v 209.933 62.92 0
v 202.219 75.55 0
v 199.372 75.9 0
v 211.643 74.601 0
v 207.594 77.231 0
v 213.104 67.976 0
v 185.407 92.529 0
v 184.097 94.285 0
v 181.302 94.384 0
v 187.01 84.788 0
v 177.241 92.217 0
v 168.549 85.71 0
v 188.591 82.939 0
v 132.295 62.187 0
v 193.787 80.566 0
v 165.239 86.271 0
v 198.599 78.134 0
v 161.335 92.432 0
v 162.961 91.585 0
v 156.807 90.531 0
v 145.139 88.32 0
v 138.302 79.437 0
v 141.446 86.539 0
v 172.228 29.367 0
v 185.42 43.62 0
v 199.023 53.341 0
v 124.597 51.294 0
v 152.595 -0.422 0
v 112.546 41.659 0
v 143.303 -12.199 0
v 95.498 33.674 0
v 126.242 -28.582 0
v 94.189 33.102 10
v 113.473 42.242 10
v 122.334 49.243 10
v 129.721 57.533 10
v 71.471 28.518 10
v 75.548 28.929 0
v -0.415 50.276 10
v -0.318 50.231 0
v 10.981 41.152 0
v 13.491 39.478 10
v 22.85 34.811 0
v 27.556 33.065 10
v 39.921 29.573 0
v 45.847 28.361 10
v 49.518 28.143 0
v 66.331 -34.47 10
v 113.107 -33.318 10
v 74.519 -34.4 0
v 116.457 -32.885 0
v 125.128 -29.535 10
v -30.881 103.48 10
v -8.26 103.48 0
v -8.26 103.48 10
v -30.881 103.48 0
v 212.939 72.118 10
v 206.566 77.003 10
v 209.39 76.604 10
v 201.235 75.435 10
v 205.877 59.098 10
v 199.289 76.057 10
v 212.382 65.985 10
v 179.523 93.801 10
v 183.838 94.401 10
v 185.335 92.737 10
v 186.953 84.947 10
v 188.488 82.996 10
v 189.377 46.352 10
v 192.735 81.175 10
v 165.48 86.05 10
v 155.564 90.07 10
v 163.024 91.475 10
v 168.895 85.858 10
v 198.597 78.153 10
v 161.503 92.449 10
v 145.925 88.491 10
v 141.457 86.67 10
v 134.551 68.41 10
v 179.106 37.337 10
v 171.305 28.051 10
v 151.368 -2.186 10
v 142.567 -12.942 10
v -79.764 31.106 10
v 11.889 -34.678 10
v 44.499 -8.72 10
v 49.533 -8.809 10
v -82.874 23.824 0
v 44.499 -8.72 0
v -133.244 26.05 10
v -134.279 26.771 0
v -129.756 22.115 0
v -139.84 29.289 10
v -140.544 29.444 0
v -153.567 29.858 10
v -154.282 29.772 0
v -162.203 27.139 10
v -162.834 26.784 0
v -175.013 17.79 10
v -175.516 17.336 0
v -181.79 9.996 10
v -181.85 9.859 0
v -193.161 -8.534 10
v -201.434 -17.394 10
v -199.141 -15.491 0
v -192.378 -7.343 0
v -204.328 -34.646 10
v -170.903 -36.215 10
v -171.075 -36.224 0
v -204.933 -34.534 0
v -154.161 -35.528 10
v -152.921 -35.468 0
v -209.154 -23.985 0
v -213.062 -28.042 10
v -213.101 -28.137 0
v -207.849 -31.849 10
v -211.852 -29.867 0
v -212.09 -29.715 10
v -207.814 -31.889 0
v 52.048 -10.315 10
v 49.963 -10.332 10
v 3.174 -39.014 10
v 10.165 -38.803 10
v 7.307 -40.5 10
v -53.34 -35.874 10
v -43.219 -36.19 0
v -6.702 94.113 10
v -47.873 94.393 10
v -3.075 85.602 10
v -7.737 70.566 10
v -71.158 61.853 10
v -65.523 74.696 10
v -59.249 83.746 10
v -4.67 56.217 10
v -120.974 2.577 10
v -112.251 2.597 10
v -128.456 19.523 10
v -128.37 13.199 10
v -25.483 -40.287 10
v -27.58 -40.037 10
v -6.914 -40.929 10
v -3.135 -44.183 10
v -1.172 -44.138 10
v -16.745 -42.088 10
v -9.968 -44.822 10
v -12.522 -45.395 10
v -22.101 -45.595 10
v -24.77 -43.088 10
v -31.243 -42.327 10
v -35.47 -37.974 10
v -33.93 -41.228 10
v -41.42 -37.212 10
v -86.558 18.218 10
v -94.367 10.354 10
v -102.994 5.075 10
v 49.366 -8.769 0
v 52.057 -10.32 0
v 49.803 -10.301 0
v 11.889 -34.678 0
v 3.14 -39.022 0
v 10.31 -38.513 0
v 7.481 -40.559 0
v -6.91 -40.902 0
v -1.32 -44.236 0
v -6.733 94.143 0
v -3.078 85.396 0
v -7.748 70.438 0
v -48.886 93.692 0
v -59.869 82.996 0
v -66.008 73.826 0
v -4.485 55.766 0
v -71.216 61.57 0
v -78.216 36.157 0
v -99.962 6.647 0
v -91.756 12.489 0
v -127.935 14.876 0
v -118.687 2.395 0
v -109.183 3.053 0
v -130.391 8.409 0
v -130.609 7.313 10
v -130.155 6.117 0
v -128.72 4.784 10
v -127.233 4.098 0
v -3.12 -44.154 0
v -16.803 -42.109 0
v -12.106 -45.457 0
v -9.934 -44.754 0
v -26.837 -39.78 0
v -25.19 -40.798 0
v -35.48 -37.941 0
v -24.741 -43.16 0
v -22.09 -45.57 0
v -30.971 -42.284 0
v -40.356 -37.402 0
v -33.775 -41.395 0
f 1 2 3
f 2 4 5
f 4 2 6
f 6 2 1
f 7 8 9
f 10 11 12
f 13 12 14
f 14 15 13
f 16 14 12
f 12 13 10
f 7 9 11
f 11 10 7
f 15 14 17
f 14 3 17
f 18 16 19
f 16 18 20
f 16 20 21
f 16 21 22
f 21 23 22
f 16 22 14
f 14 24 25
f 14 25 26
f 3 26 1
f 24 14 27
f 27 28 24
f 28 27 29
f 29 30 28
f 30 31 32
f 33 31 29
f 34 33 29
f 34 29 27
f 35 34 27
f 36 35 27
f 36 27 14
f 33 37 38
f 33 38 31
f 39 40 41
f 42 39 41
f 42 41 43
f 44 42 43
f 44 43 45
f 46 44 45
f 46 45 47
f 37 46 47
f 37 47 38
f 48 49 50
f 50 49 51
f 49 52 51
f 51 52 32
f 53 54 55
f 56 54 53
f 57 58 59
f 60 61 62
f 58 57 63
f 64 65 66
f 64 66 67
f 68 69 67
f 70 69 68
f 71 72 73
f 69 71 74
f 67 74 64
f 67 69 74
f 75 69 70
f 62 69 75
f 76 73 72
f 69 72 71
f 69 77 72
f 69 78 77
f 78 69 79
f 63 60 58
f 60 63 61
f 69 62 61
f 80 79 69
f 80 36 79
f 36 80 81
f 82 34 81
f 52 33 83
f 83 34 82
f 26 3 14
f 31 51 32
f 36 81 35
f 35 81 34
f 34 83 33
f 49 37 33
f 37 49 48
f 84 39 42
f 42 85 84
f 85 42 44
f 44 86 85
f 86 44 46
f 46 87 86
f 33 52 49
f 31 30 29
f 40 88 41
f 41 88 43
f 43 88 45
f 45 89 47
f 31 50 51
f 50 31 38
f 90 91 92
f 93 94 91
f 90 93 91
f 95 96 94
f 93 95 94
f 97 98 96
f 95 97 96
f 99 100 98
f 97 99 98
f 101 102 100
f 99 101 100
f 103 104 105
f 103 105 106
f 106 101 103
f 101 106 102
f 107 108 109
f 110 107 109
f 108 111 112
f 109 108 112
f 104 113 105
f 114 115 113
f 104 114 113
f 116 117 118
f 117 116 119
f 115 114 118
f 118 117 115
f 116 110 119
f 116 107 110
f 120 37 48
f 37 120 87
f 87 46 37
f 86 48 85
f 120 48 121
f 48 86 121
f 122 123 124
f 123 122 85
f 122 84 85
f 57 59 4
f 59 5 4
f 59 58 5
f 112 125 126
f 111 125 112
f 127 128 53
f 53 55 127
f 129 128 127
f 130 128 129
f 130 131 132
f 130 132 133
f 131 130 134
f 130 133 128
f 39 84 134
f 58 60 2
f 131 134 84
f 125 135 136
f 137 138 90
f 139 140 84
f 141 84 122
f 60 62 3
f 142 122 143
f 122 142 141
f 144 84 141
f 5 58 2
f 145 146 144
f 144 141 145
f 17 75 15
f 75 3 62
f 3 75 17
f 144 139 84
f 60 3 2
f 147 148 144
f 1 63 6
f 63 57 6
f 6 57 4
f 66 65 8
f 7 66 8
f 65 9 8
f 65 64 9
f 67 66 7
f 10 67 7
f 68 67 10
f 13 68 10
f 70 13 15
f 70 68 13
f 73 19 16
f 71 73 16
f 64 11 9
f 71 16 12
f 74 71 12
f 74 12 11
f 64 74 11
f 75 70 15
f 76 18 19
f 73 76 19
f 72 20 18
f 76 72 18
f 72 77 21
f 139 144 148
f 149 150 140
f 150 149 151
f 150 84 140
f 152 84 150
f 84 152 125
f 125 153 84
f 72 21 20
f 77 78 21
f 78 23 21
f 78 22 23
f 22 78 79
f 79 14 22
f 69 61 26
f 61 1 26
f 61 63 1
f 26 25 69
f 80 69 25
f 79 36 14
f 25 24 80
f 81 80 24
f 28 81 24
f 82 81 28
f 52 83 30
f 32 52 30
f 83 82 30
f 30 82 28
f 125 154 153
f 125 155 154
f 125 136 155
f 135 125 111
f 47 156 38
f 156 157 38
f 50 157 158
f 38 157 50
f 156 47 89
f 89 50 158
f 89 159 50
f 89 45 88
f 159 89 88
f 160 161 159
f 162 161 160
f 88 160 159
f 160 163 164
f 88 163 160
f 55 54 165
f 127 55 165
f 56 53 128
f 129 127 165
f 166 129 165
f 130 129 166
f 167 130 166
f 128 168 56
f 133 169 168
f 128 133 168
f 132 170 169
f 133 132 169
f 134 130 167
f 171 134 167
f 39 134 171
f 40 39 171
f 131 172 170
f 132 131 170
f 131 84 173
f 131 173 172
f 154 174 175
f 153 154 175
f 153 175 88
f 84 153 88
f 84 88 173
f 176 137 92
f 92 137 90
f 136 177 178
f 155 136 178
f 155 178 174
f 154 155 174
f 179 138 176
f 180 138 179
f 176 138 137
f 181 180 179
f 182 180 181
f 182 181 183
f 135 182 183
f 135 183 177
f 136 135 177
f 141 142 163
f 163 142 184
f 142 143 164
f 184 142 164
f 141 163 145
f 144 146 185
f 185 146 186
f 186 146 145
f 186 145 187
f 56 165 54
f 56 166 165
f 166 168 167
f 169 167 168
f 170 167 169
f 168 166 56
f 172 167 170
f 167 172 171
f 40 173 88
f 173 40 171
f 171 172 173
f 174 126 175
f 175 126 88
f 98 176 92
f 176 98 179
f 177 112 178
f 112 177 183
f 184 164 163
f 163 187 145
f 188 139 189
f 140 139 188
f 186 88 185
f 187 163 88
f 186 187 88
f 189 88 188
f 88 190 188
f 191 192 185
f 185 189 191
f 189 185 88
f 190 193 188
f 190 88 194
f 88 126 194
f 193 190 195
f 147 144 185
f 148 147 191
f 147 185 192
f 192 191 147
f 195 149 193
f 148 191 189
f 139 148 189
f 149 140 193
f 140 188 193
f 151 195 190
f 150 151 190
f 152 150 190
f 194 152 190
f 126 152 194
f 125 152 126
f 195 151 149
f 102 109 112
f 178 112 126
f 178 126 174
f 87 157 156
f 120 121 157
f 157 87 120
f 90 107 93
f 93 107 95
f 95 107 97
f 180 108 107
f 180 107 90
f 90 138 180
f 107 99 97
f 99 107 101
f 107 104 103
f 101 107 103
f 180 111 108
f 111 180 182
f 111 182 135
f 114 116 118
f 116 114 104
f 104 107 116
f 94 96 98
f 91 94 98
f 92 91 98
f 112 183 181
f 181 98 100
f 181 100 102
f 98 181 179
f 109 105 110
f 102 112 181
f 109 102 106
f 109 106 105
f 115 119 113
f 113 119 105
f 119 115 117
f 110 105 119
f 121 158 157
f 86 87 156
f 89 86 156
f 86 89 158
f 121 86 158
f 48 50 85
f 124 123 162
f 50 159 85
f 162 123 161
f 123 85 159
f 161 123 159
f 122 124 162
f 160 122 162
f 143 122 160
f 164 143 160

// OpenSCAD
module object1(scale) {polyhedron(
 points=[[199.37167358398438,75.90013885498047,0],[202.21896362304688,75.55001068115234,0],[209.93312072753906,62.91959762573242,0],
[207.5940704345703,77.23053741455078,0],[211.64306640625,74.60130310058594,0],[202.21896362304688,75.55001068115234,0],
[213.1039581298828,67.97622680664062,0],[202.21896362304688,75.55001068115234,0],[211.64306640625,74.60130310058594,0],
[209.93312072753906,62.91959762573242,0],[202.21896362304688,75.55001068115234,0],[213.1039581298828,67.97622680664062,0],
[181.3023681640625,94.38363647460938,0],[184.09671020507812,94.28502655029297,0],[185.40660095214844,92.5289535522461,0],
[168.54913330078125,85.71012115478516,0],[177.24105834960938,92.21691131591797,0],[187.0101776123047,84.78828430175781,0],
[132.2948760986328,62.18728256225586,0],[168.54913330078125,85.71012115478516,0],[188.59071350097656,82.93917846679688,0],
[188.59071350097656,82.93917846679688,0],[193.78683471679688,80.5660629272461,0],[132.2948760986328,62.18728256225586,0],
[168.54913330078125,85.71012115478516,0],[132.2948760986328,62.18728256225586,0],[165.23886108398438,86.27050018310547,0],
[187.0101776123047,84.78828430175781,0],[188.59071350097656,82.93917846679688,0],[168.54913330078125,85.71012115478516,0],
[177.24105834960938,92.21691131591797,0],[181.3023681640625,94.38363647460938,0],[185.40660095214844,92.5289535522461,0],
[185.40660095214844,92.5289535522461,0],[187.0101776123047,84.78828430175781,0],[177.24105834960938,92.21691131591797,0],
[198.59877014160156,78.13407135009766,0],[132.2948760986328,62.18728256225586,0],[193.78683471679688,80.5660629272461,0],
[198.59877014160156,78.13407135009766,0],[199.37167358398438,75.90013885498047,0],[132.2948760986328,62.18728256225586,0],
[162.96141052246094,91.58535766601562,0],[165.23886108398438,86.27050018310547,0],[161.33468627929688,92.43206787109375,0],
[156.8072967529297,90.53131866455078,0],[161.33468627929688,92.43206787109375,0],[165.23886108398438,86.27050018310547,0],
[145.1394500732422,88.31961822509766,0],[156.8072967529297,90.53131866455078,0],[165.23886108398438,86.27050018310547,0],
[138.30226135253906,79.4373550415039,0],[145.1394500732422,88.31961822509766,0],[165.23886108398438,86.27050018310547,0],
[138.30226135253906,79.4373550415039,0],[141.44580078125,86.53934478759766,0],[145.1394500732422,88.31961822509766,0],
[132.2948760986328,62.18728256225586,0],[138.30226135253906,79.4373550415039,0],[165.23886108398438,86.27050018310547,0],
[185.42034912109375,43.62025833129883,0],[172.22792053222656,29.366931915283203,0],[132.2948760986328,62.18728256225586,0],
[199.02317810058594,53.34084701538086,0],[185.42034912109375,43.62025833129883,0],[132.2948760986328,62.18728256225586,0],
[209.93312072753906,62.91959762573242,0],[199.02317810058594,53.34084701538086,0],[199.37167358398438,75.90013885498047,0],
[124.59748077392578,51.29447555541992,0],[132.2948760986328,62.18728256225586,0],[172.22792053222656,29.366931915283203,0],
[172.22792053222656,29.366931915283203,0],[152.59469604492188,-0.42217034101486206,0],[124.59748077392578,51.29447555541992,0],
[112.54574584960938,41.65903854370117,0],[124.59748077392578,51.29447555541992,0],[152.59469604492188,-0.42217034101486206,0],
[152.59469604492188,-0.42217034101486206,0],[143.30255126953125,-12.19916820526123,0],[112.54574584960938,41.65903854370117,0],
[126.24242401123047,-28.581745147705078,0],[95.49767303466797,33.674278259277344,0],[143.30255126953125,-12.19916820526123,0],
[112.54574584960938,41.65903854370117,0],[95.49767303466797,33.674278259277344,0],[94.1887435913086,33.1020393371582,10],
[112.54574584960938,41.65903854370117,0],[94.1887435913086,33.1020393371582,10],[113.4732666015625,42.2421989440918,10],
[124.59748077392578,51.29447555541992,0],[112.54574584960938,41.65903854370117,0],[113.4732666015625,42.2421989440918,10],
[124.59748077392578,51.29447555541992,0],[113.4732666015625,42.2421989440918,10],[122.33402252197266,49.24305725097656,10],
[124.59748077392578,51.29447555541992,0],[122.33402252197266,49.24305725097656,10],[129.7212371826172,57.533226013183594,10],
[132.2948760986328,62.18728256225586,0],[124.59748077392578,51.29447555541992,0],[129.7212371826172,57.533226013183594,10],
[75.54798126220703,28.928678512573242,0],[71.4708480834961,28.517797470092773,10],[94.1887435913086,33.1020393371582,10],
[95.49767303466797,33.674278259277344,0],[75.54798126220703,28.928678512573242,0],[94.1887435913086,33.1020393371582,10],
[10.981195449829102,41.152252197265625,0],[-0.3182032108306885,50.23066329956055,0],[-0.4153667092323303,50.275516510009766,10],
[10.981195449829102,41.152252197265625,0],[-0.4153667092323303,50.275516510009766,10],[13.491422653198242,39.477725982666016,10],
[22.850000381469727,34.810760498046875,0],[10.981195449829102,41.152252197265625,0],[13.491422653198242,39.477725982666016,10],
[22.850000381469727,34.810760498046875,0],[13.491422653198242,39.477725982666016,10],[27.555904388427734,33.06477737426758,10],
[39.92094802856445,29.573442459106445,0],[22.850000381469727,34.810760498046875,0],[27.555904388427734,33.06477737426758,10],
[39.92094802856445,29.573442459106445,0],[27.555904388427734,33.06477737426758,10],[45.847076416015625,28.361417770385742,10],
[49.51791763305664,28.14299201965332,0],[39.92094802856445,29.573442459106445,0],[45.847076416015625,28.361417770385742,10],
[49.51791763305664,28.14299201965332,0],[45.847076416015625,28.361417770385742,10],[71.4708480834961,28.517797470092773,10],
[75.54798126220703,28.928678512573242,0],[49.51791763305664,28.14299201965332,0],[71.4708480834961,28.517797470092773,10],
[74.51927185058594,-34.40031051635742,0],[113.10662841796875,-33.31764221191406,10],[66.33106231689453,-34.47044372558594,10],
[116.45669555664062,-32.88462829589844,0],[113.10662841796875,-33.31764221191406,10],[74.51927185058594,-34.40031051635742,0],
[116.45669555664062,-32.88462829589844,0],[125.12801361083984,-29.535409927368164,10],[113.10662841796875,-33.31764221191406,10],
[126.24242401123047,-28.581745147705078,0],[125.12801361083984,-29.535409927368164,10],[116.45669555664062,-32.88462829589844,0],
[-8.260000228881836,103.4800033569336,10],[-8.260000228881836,103.4800033569336,0],[-30.881000518798828,103.4800033569336,10],
[-30.881000518798828,103.4800033569336,10],[-8.260000228881836,103.4800033569336,0],[-30.881000518798828,103.4800033569336,0],
[209.38973999023438,76.6042251586914,10],[206.56561279296875,77.00340270996094,10],[212.93914794921875,72.11756134033203,10],
[199.28900146484375,76.05670928955078,10],[205.87713623046875,59.09784698486328,10],[201.23477172851562,75.43526458740234,10],
[212.38209533691406,65.98548126220703,10],[212.93914794921875,72.11756134033203,10],[206.56561279296875,77.00340270996094,10],
[185.33534240722656,92.7367935180664,10],[183.83792114257812,94.40069580078125,10],[179.52325439453125,93.80120086669922,10],
[186.9530792236328,84.94690704345703,10],[185.33534240722656,92.7367935180664,10],[179.52325439453125,93.80120086669922,10],
[186.9530792236328,84.94690704345703,10],[189.37725830078125,46.35154342651367,10],[188.4876708984375,82.99583435058594,10],
[188.4876708984375,82.99583435058594,10],[189.37725830078125,46.35154342651367,10],[192.73458862304688,81.174560546875,10],
[163.02427673339844,91.47467803955078,10],[155.56365966796875,90.07017517089844,10],[165.48045349121094,86.05018615722656,10],
[168.8946533203125,85.85816955566406,10],[165.48045349121094,86.05018615722656,10],[189.37725830078125,46.35154342651367,10],
[179.52325439453125,93.80120086669922,10],[168.8946533203125,85.85816955566406,10],[186.9530792236328,84.94690704345703,10],
[168.8946533203125,85.85816955566406,10],[189.37725830078125,46.35154342651367,10],[186.9530792236328,84.94690704345703,10],
[192.73458862304688,81.174560546875,10],[189.37725830078125,46.35154342651367,10],[198.5966339111328,78.153076171875,10],
[198.5966339111328,78.153076171875,10],[189.37725830078125,46.35154342651367,10],[199.28900146484375,76.05670928955078,10],
[155.56365966796875,90.07017517089844,10],[163.02427673339844,91.47467803955078,10],[161.5028076171875,92.4485092163086,10],
[165.48045349121094,86.05018615722656,10],[155.56365966796875,90.07017517089844,10],[189.37725830078125,46.35154342651367,10],
[155.56365966796875,90.07017517089844,10],[145.92495727539062,88.49105072021484,10],[189.37725830078125,46.35154342651367,10],
[145.92495727539062,88.49105072021484,10],[141.45726013183594,86.66956329345703,10],[189.37725830078125,46.35154342651367,10],
[134.55137634277344,68.40991973876953,10],[189.37725830078125,46.35154342651367,10],[141.45726013183594,86.66956329345703,10],
[206.56561279296875,77.00340270996094,10],[201.23477172851562,75.43526458740234,10],[212.38209533691406,65.98548126220703,10],
[205.87713623046875,59.09784698486328,10],[212.38209533691406,65.98548126220703,10],[201.23477172851562,75.43526458740234,10],
[205.87713623046875,59.09784698486328,10],[199.28900146484375,76.05670928955078,10],[189.37725830078125,46.35154342651367,10],
[189.37725830078125,46.35154342651367,10],[134.55137634277344,68.40991973876953,10],[179.1058349609375,37.33666229248047,10],
[134.55137634277344,68.40991973876953,10],[129.7212371826172,57.533226013183594,10],[179.1058349609375,37.33666229248047,10],
[171.30477905273438,28.05082893371582,10],[179.1058349609375,37.33666229248047,10],[129.7212371826172,57.533226013183594,10],
[171.30477905273438,28.05082893371582,10],[113.4732666015625,42.2421989440918,10],[151.36825561523438,-2.185760974884033,10],
[142.56651306152344,-12.942140579223633,10],[94.1887435913086,33.1020393371582,10],[125.12801361083984,-29.535409927368164,10],
[151.36825561523438,-2.185760974884033,10],[113.4732666015625,42.2421989440918,10],[142.56651306152344,-12.942140579223633,10],
[132.2948760986328,62.18728256225586,0],[199.37167358398438,75.90013885498047,0],[199.02317810058594,53.34084701538086,0],
[126.24242401123047,-28.581745147705078,0],[116.45669555664062,-32.88462829589844,0],[95.49767303466797,33.674278259277344,0],
[122.33402252197266,49.24305725097656,10],[171.30477905273438,28.05082893371582,10],[129.7212371826172,57.533226013183594,10],
[113.4732666015625,42.2421989440918,10],[171.30477905273438,28.05082893371582,10],[122.33402252197266,49.24305725097656,10],
[94.1887435913086,33.1020393371582,10],[142.56651306152344,-12.942140579223633,10],[113.4732666015625,42.2421989440918,10],
[94.1887435913086,33.1020393371582,10],[71.4708480834961,28.517797470092773,10],[113.10662841796875,-33.31764221191406,10],
[66.33106231689453,-34.47044372558594,10],[113.10662841796875,-33.31764221191406,10],[71.4708480834961,28.517797470092773,10],
[13.491422653198242,39.477725982666016,10],[-0.4153667092323303,50.275516510009766,10],[-79.7637710571289,31.10643196105957,10],
[-79.7637710571289,31.10643196105957,10],[11.888999938964844,-34.678001403808594,10],[13.491422653198242,39.477725982666016,10],
[27.555904388427734,33.06477737426758,10],[13.491422653198242,39.477725982666016,10],[11.888999938964844,-34.678001403808594,10],
[11.888999938964844,-34.678001403808594,10],[44.499000549316406,-8.720000267028809,10],[27.555904388427734,33.06477737426758,10],
[45.847076416015625,28.361417770385742,10],[27.555904388427734,33.06477737426758,10],[44.499000549316406,-8.720000267028809,10],
[44.499000549316406,-8.720000267028809,10],[49.53274154663086,-8.809224128723145,10],[45.847076416015625,28.361417770385742,10],
[113.10662841796875,-33.31764221191406,10],[125.12801361083984,-29.535409927368164,10],[94.1887435913086,33.1020393371582,10],
[112.54574584960938,41.65903854370117,0],[143.30255126953125,-12.19916820526123,0],[95.49767303466797,33.674278259277344,0],
[10.981195449829102,41.152252197265625,0],[-82.87432098388672,23.8238582611084,0],[-0.3182032108306885,50.23066329956055,0],
[22.850000381469727,34.810760498046875,0],[-82.87432098388672,23.8238582611084,0],[10.981195449829102,41.152252197265625,0],
[39.92094802856445,29.573442459106445,0],[-82.87432098388672,23.8238582611084,0],[22.850000381469727,34.810760498046875,0],
[49.51791763305664,28.14299201965332,0],[44.499000549316406,-8.720000267028809,0],[39.92094802856445,29.573442459106445,0],
[116.45669555664062,-32.88462829589844,0],[74.51927185058594,-34.40031051635742,0],[95.49767303466797,33.674278259277344,0],
[75.54798126220703,28.928678512573242,0],[95.49767303466797,33.674278259277344,0],[74.51927185058594,-34.40031051635742,0],
[-129.7556915283203,22.115089416503906,0],[-134.27857971191406,26.770544052124023,0],[-133.2444610595703,26.04967498779297,10],
[-134.27857971191406,26.770544052124023,0],[-140.54364013671875,29.44390869140625,0],[-139.84039306640625,29.28890037536621,10],
[-134.27857971191406,26.770544052124023,0],[-139.84039306640625,29.28890037536621,10],[-133.2444610595703,26.04967498779297,10],
[-140.54364013671875,29.44390869140625,0],[-154.28233337402344,29.771726608276367,0],[-153.567138671875,29.858436584472656,10],
[-140.54364013671875,29.44390869140625,0],[-153.567138671875,29.858436584472656,10],[-139.84039306640625,29.28890037536621,10],
[-154.28233337402344,29.771726608276367,0],[-162.83412170410156,26.783966064453125,0],[-162.2031707763672,27.13936996459961,10],
[-154.28233337402344,29.771726608276367,0],[-162.2031707763672,27.13936996459961,10],[-153.567138671875,29.858436584472656,10],
[-162.83412170410156,26.783966064453125,0],[-175.51565551757812,17.33550262451172,0],[-175.01324462890625,17.790390014648438,10],
[-162.83412170410156,26.783966064453125,0],[-175.01324462890625,17.790390014648438,10],[-162.2031707763672,27.13936996459961,10],
[-175.51565551757812,17.33550262451172,0],[-181.8504180908203,9.858535766601562,0],[-181.78970336914062,9.995529174804688,10],
[-175.51565551757812,17.33550262451172,0],[-181.78970336914062,9.995529174804688,10],[-175.01324462890625,17.790390014648438,10],
[-199.14105224609375,-15.491259574890137,0],[-201.43392944335938,-17.39444923400879,10],[-193.16064453125,-8.533787727355957,10],
[-192.3775634765625,-7.343181133270264,0],[-199.14105224609375,-15.491259574890137,0],[-193.16064453125,-8.533787727355957,10],
[-193.16064453125,-8.533787727355957,10],[-181.78970336914062,9.995529174804688,10],[-192.3775634765625,-7.343181133270264,0],
[-181.8504180908203,9.858535766601562,0],[-192.3775634765625,-7.343181133270264,0],[-181.78970336914062,9.995529174804688,10],
[-171.0751953125,-36.22438049316406,0],[-170.90338134765625,-36.21523666381836,10],[-204.3284912109375,-34.645782470703125,10],
[-171.0751953125,-36.22438049316406,0],[-204.3284912109375,-34.645782470703125,10],[-204.9325714111328,-34.53371047973633,0],
[-152.92137145996094,-35.468204498291016,0],[-154.16140747070312,-35.52764892578125,10],[-170.90338134765625,-36.21523666381836,10],
[-152.92137145996094,-35.468204498291016,0],[-170.90338134765625,-36.21523666381836,10],[-171.0751953125,-36.22438049316406,0],
[-199.14105224609375,-15.491259574890137,0],[-209.1544952392578,-23.985443115234375,0],[-201.43392944335938,-17.39444923400879,10],
[-209.1544952392578,-23.985443115234375,0],[-213.1012725830078,-28.137075424194336,0],[-213.0622100830078,-28.042200088500977,10],
[-209.1544952392578,-23.985443115234375,0],[-213.0622100830078,-28.042200088500977,10],[-201.43392944335938,-17.39444923400879,10],
[-212.09007263183594,-29.714599609375,10],[-211.85186767578125,-29.86714744567871,0],[-207.84930419921875,-31.84939193725586,10],
[-207.81443786621094,-31.88942527770996,0],[-207.84930419921875,-31.84939193725586,10],[-211.85186767578125,-29.86714744567871,0],
[-212.09007263183594,-29.714599609375,10],[-213.0622100830078,-28.042200088500977,10],[-213.1012725830078,-28.137075424194336,0],
[-213.1012725830078,-28.137075424194336,0],[-211.85186767578125,-29.86714744567871,0],[-212.09007263183594,-29.714599609375,10],
[-207.81443786621094,-31.88942527770996,0],[-204.9325714111328,-34.53371047973633,0],[-207.84930419921875,-31.84939193725586,10],
[-204.9325714111328,-34.53371047973633,0],[-204.3284912109375,-34.645782470703125,10],[-207.84930419921875,-31.84939193725586,10],
[66.33106231689453,-34.47044372558594,10],[71.4708480834961,28.517797470092773,10],[52.048072814941406,-10.315421104431152,10],
[49.53274154663086,-8.809224128723145,10],[52.048072814941406,-10.315421104431152,10],[71.4708480834961,28.517797470092773,10],
[71.4708480834961,28.517797470092773,10],[45.847076416015625,28.361417770385742,10],[49.53274154663086,-8.809224128723145,10],
[11.888999938964844,-34.678001403808594,10],[66.33106231689453,-34.47044372558594,10],[44.499000549316406,-8.720000267028809,10],
[49.962650299072266,-10.331576347351074,10],[66.33106231689453,-34.47044372558594,10],[52.048072814941406,-10.315421104431152,10],
[49.962650299072266,-10.331576347351074,10],[44.499000549316406,-8.720000267028809,10],[66.33106231689453,-34.47044372558594,10],
[7.306832790374756,-40.499656677246094,10],[10.165343284606934,-38.80281066894531,10],[3.173877239227295,-39.01404571533203,10],
[11.888999938964844,-34.678001403808594,10],[3.173877239227295,-39.01404571533203,10],[10.165343284606934,-38.80281066894531,10],
[11.888999938964844,-34.678001403808594,10],[-79.7637710571289,31.10643196105957,10],[3.173877239227295,-39.01404571533203,10],
[211.64306640625,74.60130310058594,0],[209.38973999023438,76.6042251586914,10],[212.93914794921875,72.11756134033203,10],
[211.64306640625,74.60130310058594,0],[207.5940704345703,77.23053741455078,0],[209.38973999023438,76.6042251586914,10],
[207.5940704345703,77.23053741455078,0],[206.56561279296875,77.00340270996094,10],[209.38973999023438,76.6042251586914,10],
[-43.21868896484375,-36.18983459472656,0],[-53.33951187133789,-35.874061584472656,10],[-152.92137145996094,-35.468204498291016,0],
[-152.92137145996094,-35.468204498291016,0],[-53.33951187133789,-35.874061584472656,10],[-154.16140747070312,-35.52764892578125,10],
[-30.881000518798828,103.4800033569336,10],[-47.872615814208984,94.39278411865234,10],[-6.701964378356934,94.11285400390625,10],
[-6.701964378356934,94.11285400390625,10],[-8.260000228881836,103.4800033569336,10],[-30.881000518798828,103.4800033569336,10],
[-6.701964378356934,94.11285400390625,10],[-47.872615814208984,94.39278411865234,10],[-3.074937343597412,85.6019058227539,10],
[-3.074937343597412,85.6019058227539,10],[-47.872615814208984,94.39278411865234,10],[-7.737444877624512,70.5660629272461,10],
[-65.5233154296875,74.696044921875,10],[-71.158203125,61.85307693481445,10],[-7.737444877624512,70.5660629272461,10],
[-59.248958587646484,83.74592590332031,10],[-65.5233154296875,74.696044921875,10],[-7.737444877624512,70.5660629272461,10],
[-4.6702046394348145,56.216670989990234,10],[-7.737444877624512,70.5660629272461,10],[-71.158203125,61.85307693481445,10],
[-47.872615814208984,94.39278411865234,10],[-59.248958587646484,83.74592590332031,10],[-7.737444877624512,70.5660629272461,10],
[-4.6702046394348145,56.216670989990234,10],[-79.7637710571289,31.10643196105957,10],[-0.4153667092323303,50.275516510009766,10],
[202.21896362304688,75.55001068115234,0],[201.23477172851562,75.43526458740234,10],[206.56561279296875,77.00340270996094,10],
[-79.7637710571289,31.10643196105957,10],[-4.6702046394348145,56.216670989990234,10],[-71.158203125,61.85307693481445,10],
[-112.2509994506836,2.5969998836517334,10],[-120.97369384765625,2.577406167984009,10],[-53.33951187133789,-35.874061584472656,10],
[-133.2444610595703,26.04967498779297,10],[-128.36959838867188,13.199297904968262,10],[-128.45645141601562,19.52318572998047,10],
[-79.7637710571289,31.10643196105957,10],[-27.580223083496094,-40.037071228027344,10],[-25.483245849609375,-40.286685943603516,10],
[3.173877239227295,-39.01404571533203,10],[-79.7637710571289,31.10643196105957,10],[-6.914295196533203,-40.92919921875,10],
[199.37167358398438,75.90013885498047,0],[199.28900146484375,76.05670928955078,10],[201.23477172851562,75.43526458740234,10],
[-1.1721389293670654,-44.13786697387695,10],[3.173877239227295,-39.01404571533203,10],[-3.135453224182129,-44.18324279785156,10],
[-6.914295196533203,-40.92919921875,10],[-3.135453224182129,-44.18324279785156,10],[3.173877239227295,-39.01404571533203,10],
[-6.914295196533203,-40.92919921875,10],[-79.7637710571289,31.10643196105957,10],[-16.7452392578125,-42.088287353515625,10],
[202.21896362304688,75.55001068115234,0],[206.56561279296875,77.00340270996094,10],[207.5940704345703,77.23053741455078,0],
[-16.7452392578125,-42.088287353515625,10],[-12.522496223449707,-45.394588470458984,10],[-9.967960357666016,-44.82192611694336,10],
[-9.967960357666016,-44.82192611694336,10],[-6.914295196533203,-40.92919921875,10],[-16.7452392578125,-42.088287353515625,10],
[193.78683471679688,80.5660629272461,0],[198.5966339111328,78.153076171875,10],[198.59877014160156,78.13407135009766,0],
[199.28900146484375,76.05670928955078,10],[199.37167358398438,75.90013885498047,0],[198.5966339111328,78.153076171875,10],
[198.59877014160156,78.13407135009766,0],[198.5966339111328,78.153076171875,10],[199.37167358398438,75.90013885498047,0],
[-79.7637710571289,31.10643196105957,10],[-25.483245849609375,-40.286685943603516,10],[-16.7452392578125,-42.088287353515625,10],
[202.21896362304688,75.55001068115234,0],[199.37167358398438,75.90013885498047,0],[201.23477172851562,75.43526458740234,10],
[-16.7452392578125,-42.088287353515625,10],[-24.770307540893555,-43.088199615478516,10],[-22.10101318359375,-45.594539642333984,10],
[213.1039581298828,67.97622680664062,0],[212.38209533691406,65.98548126220703,10],[209.93312072753906,62.91959762573242,0],
[213.1039581298828,67.97622680664062,0],[212.93914794921875,72.11756134033203,10],[212.38209533691406,65.98548126220703,10],
[211.64306640625,74.60130310058594,0],[212.93914794921875,72.11756134033203,10],[213.1039581298828,67.97622680664062,0],
[184.09671020507812,94.28502655029297,0],[183.83792114257812,94.40069580078125,10],[185.33534240722656,92.7367935180664,10],
[184.09671020507812,94.28502655029297,0],[185.33534240722656,92.7367935180664,10],[185.40660095214844,92.5289535522461,0],
[184.09671020507812,94.28502655029297,0],[181.3023681640625,94.38363647460938,0],[183.83792114257812,94.40069580078125,10],
[181.3023681640625,94.38363647460938,0],[179.52325439453125,93.80120086669922,10],[183.83792114257812,94.40069580078125,10],
[185.40660095214844,92.5289535522461,0],[185.33534240722656,92.7367935180664,10],[186.9530792236328,84.94690704345703,10],
[185.40660095214844,92.5289535522461,0],[186.9530792236328,84.94690704345703,10],[187.0101776123047,84.78828430175781,0],
[187.0101776123047,84.78828430175781,0],[186.9530792236328,84.94690704345703,10],[188.4876708984375,82.99583435058594,10],
[187.0101776123047,84.78828430175781,0],[188.4876708984375,82.99583435058594,10],[188.59071350097656,82.93917846679688,0],
[193.78683471679688,80.5660629272461,0],[188.59071350097656,82.93917846679688,0],[192.73458862304688,81.174560546875,10],
[188.59071350097656,82.93917846679688,0],[188.4876708984375,82.99583435058594,10],[192.73458862304688,81.174560546875,10],
[165.23886108398438,86.27050018310547,0],[162.96141052246094,91.58535766601562,0],[163.02427673339844,91.47467803955078,10],
[165.23886108398438,86.27050018310547,0],[163.02427673339844,91.47467803955078,10],[165.48045349121094,86.05018615722656,10],
[181.3023681640625,94.38363647460938,0],[177.24105834960938,92.21691131591797,0],[179.52325439453125,93.80120086669922,10],
[168.54913330078125,85.71012115478516,0],[165.23886108398438,86.27050018310547,0],[165.48045349121094,86.05018615722656,10],
[168.54913330078125,85.71012115478516,0],[165.48045349121094,86.05018615722656,10],[168.8946533203125,85.85816955566406,10],
[177.24105834960938,92.21691131591797,0],[168.54913330078125,85.71012115478516,0],[168.8946533203125,85.85816955566406,10],
[177.24105834960938,92.21691131591797,0],[168.8946533203125,85.85816955566406,10],[179.52325439453125,93.80120086669922,10],
[193.78683471679688,80.5660629272461,0],[192.73458862304688,81.174560546875,10],[198.5966339111328,78.153076171875,10],
[162.96141052246094,91.58535766601562,0],[161.33468627929688,92.43206787109375,0],[161.5028076171875,92.4485092163086,10],
[162.96141052246094,91.58535766601562,0],[161.5028076171875,92.4485092163086,10],[163.02427673339844,91.47467803955078,10],
[161.33468627929688,92.43206787109375,0],[156.8072967529297,90.53131866455078,0],[155.56365966796875,90.07017517089844,10],
[161.33468627929688,92.43206787109375,0],[155.56365966796875,90.07017517089844,10],[161.5028076171875,92.4485092163086,10],
[145.1394500732422,88.31961822509766,0],[145.92495727539062,88.49105072021484,10],[155.56365966796875,90.07017517089844,10],
[-24.770307540893555,-43.088199615478516,10],[-16.7452392578125,-42.088287353515625,10],[-25.483245849609375,-40.286685943603516,10],
[-27.580223083496094,-40.037071228027344,10],[-35.47004699707031,-37.97396469116211,10],[-31.242631912231445,-42.32703399658203,10],
[-33.92977523803711,-41.22837448120117,10],[-31.242631912231445,-42.32703399658203,10],[-35.47004699707031,-37.97396469116211,10],
[-27.580223083496094,-40.037071228027344,10],[-79.7637710571289,31.10643196105957,10],[-35.47004699707031,-37.97396469116211,10],
[-35.47004699707031,-37.97396469116211,10],[-79.7637710571289,31.10643196105957,10],[-41.4198112487793,-37.21235656738281,10],
[-53.33951187133789,-35.874061584472656,10],[-41.4198112487793,-37.21235656738281,10],[-79.7637710571289,31.10643196105957,10],
[-79.7637710571289,31.10643196105957,10],[-86.5580825805664,18.218172073364258,10],[-53.33951187133789,-35.874061584472656,10],
[156.8072967529297,90.53131866455078,0],[145.1394500732422,88.31961822509766,0],[155.56365966796875,90.07017517089844,10],
[145.1394500732422,88.31961822509766,0],[141.45726013183594,86.66956329345703,10],[145.92495727539062,88.49105072021484,10],
[145.1394500732422,88.31961822509766,0],[141.44580078125,86.53934478759766,0],[141.45726013183594,86.66956329345703,10],
[141.44580078125,86.53934478759766,0],[138.30226135253906,79.4373550415039,0],[141.45726013183594,86.66956329345703,10],
[134.55137634277344,68.40991973876953,10],[141.45726013183594,86.66956329345703,10],[138.30226135253906,79.4373550415039,0],
[138.30226135253906,79.4373550415039,0],[132.2948760986328,62.18728256225586,0],[134.55137634277344,68.40991973876953,10],
[199.02317810058594,53.34084701538086,0],[205.87713623046875,59.09784698486328,10],[189.37725830078125,46.35154342651367,10],
[199.02317810058594,53.34084701538086,0],[209.93312072753906,62.91959762573242,0],[205.87713623046875,59.09784698486328,10],
[209.93312072753906,62.91959762573242,0],[212.38209533691406,65.98548126220703,10],[205.87713623046875,59.09784698486328,10],
[189.37725830078125,46.35154342651367,10],[185.42034912109375,43.62025833129883,0],[199.02317810058594,53.34084701538086,0],
[185.42034912109375,43.62025833129883,0],[189.37725830078125,46.35154342651367,10],[179.1058349609375,37.33666229248047,10],
[132.2948760986328,62.18728256225586,0],[129.7212371826172,57.533226013183594,10],[134.55137634277344,68.40991973876953,10],
[179.1058349609375,37.33666229248047,10],[172.22792053222656,29.366931915283203,0],[185.42034912109375,43.62025833129883,0],
[172.22792053222656,29.366931915283203,0],[179.1058349609375,37.33666229248047,10],[171.30477905273438,28.05082893371582,10],
[172.22792053222656,29.366931915283203,0],[171.30477905273438,28.05082893371582,10],[152.59469604492188,-0.42217034101486206,0],
[152.59469604492188,-0.42217034101486206,0],[171.30477905273438,28.05082893371582,10],[151.36825561523438,-2.185760974884033,10],
[143.30255126953125,-12.19916820526123,0],[142.56651306152344,-12.942140579223633,10],[125.12801361083984,-29.535409927368164,10],
[143.30255126953125,-12.19916820526123,0],[125.12801361083984,-29.535409927368164,10],[126.24242401123047,-28.581745147705078,0],
[143.30255126953125,-12.19916820526123,0],[151.36825561523438,-2.185760974884033,10],[142.56651306152344,-12.942140579223633,10],
[152.59469604492188,-0.42217034101486206,0],[151.36825561523438,-2.185760974884033,10],[143.30255126953125,-12.19916820526123,0],
[-86.5580825805664,18.218172073364258,10],[-94.36699676513672,10.354000091552734,10],[-53.33951187133789,-35.874061584472656,10],
[-94.36699676513672,10.354000091552734,10],[-102.994140625,5.075331211090088,10],[-53.33951187133789,-35.874061584472656,10],
[-102.994140625,5.075331211090088,10],[-112.2509994506836,2.5969998836517334,10],[-53.33951187133789,-35.874061584472656,10],
[-154.16140747070312,-35.52764892578125,10],[-53.33951187133789,-35.874061584472656,10],[-120.97369384765625,2.577406167984009,10],
[75.54798126220703,28.928678512573242,0],[49.36561584472656,-8.76927375793457,0],[49.51791763305664,28.14299201965332,0],
[75.54798126220703,28.928678512573242,0],[52.056949615478516,-10.32032585144043,0],[49.36561584472656,-8.76927375793457,0],
[49.80349349975586,-10.301359176635742,0],[52.056949615478516,-10.32032585144043,0],[74.51927185058594,-34.40031051635742,0],
[74.51927185058594,-34.40031051635742,0],[52.056949615478516,-10.32032585144043,0],[75.54798126220703,28.928678512573242,0],
[44.499000549316406,-8.720000267028809,0],[49.51791763305664,28.14299201965332,0],[49.36561584472656,-8.76927375793457,0],
[49.80349349975586,-10.301359176635742,0],[74.51927185058594,-34.40031051635742,0],[44.499000549316406,-8.720000267028809,0],
[74.51927185058594,-34.40031051635742,0],[11.888999938964844,-34.678001403808594,0],[44.499000549316406,-8.720000267028809,0],
[-82.87432098388672,23.8238582611084,0],[39.92094802856445,29.573442459106445,0],[44.499000549316406,-8.720000267028809,0],
[-82.87432098388672,23.8238582611084,0],[44.499000549316406,-8.720000267028809,0],[11.888999938964844,-34.678001403808594,0],
[11.888999938964844,-34.678001403808594,0],[10.309722900390625,-38.512943267822266,0],[3.1396639347076416,-39.02231216430664,0],
[3.1396639347076416,-39.02231216430664,0],[10.309722900390625,-38.512943267822266,0],[7.481036186218262,-40.55931091308594,0],
[11.888999938964844,-34.678001403808594,0],[3.1396639347076416,-39.02231216430664,0],[-82.87432098388672,23.8238582611084,0],
[-1.3202555179595947,-44.23619842529297,0],[-6.910058498382568,-40.90201950073242,0],[3.1396639347076416,-39.02231216430664,0],
[3.1396639347076416,-39.02231216430664,0],[-6.910058498382568,-40.90201950073242,0],[-82.87432098388672,23.8238582611084,0],
[-6.732726097106934,94.14342498779297,0],[-8.260000228881836,103.4800033569336,0],[-8.260000228881836,103.4800033569336,10],
[-6.732726097106934,94.14342498779297,0],[-8.260000228881836,103.4800033569336,10],[-6.701964378356934,94.11285400390625,10],
[-47.872615814208984,94.39278411865234,10],[-30.881000518798828,103.4800033569336,10],[-30.881000518798828,103.4800033569336,0],
[-6.732726097106934,94.14342498779297,0],[-6.701964378356934,94.11285400390625,10],[-3.074937343597412,85.6019058227539,10],
[-6.732726097106934,94.14342498779297,0],[-3.074937343597412,85.6019058227539,10],[-3.0780553817749023,85.39581298828125,0],
[-3.0780553817749023,85.39581298828125,0],[-3.074937343597412,85.6019058227539,10],[-7.737444877624512,70.5660629272461,10],
[-3.0780553817749023,85.39581298828125,0],[-7.737444877624512,70.5660629272461,10],[-7.748112201690674,70.4377670288086,0],
[-30.881000518798828,103.4800033569336,0],[-48.8859977722168,93.69190979003906,0],[-47.872615814208984,94.39278411865234,10],
[-48.8859977722168,93.69190979003906,0],[-59.868553161621094,82.99637603759766,0],[-59.248958587646484,83.74592590332031,10],
[-48.8859977722168,93.69190979003906,0],[-59.248958587646484,83.74592590332031,10],[-47.872615814208984,94.39278411865234,10],
[-59.868553161621094,82.99637603759766,0],[-66.00833129882812,73.82632446289062,0],[-65.5233154296875,74.696044921875,10],
[-59.868553161621094,82.99637603759766,0],[-65.5233154296875,74.696044921875,10],[-59.248958587646484,83.74592590332031,10],
[-7.748112201690674,70.4377670288086,0],[-7.737444877624512,70.5660629272461,10],[-4.6702046394348145,56.216670989990234,10],
[-7.748112201690674,70.4377670288086,0],[-4.6702046394348145,56.216670989990234,10],[-4.485143184661865,55.76621627807617,0],
[-4.485143184661865,55.76621627807617,0],[-4.6702046394348145,56.216670989990234,10],[-0.4153667092323303,50.275516510009766,10],
[-4.485143184661865,55.76621627807617,0],[-0.4153667092323303,50.275516510009766,10],[-0.3182032108306885,50.23066329956055,0],
[-66.00833129882812,73.82632446289062,0],[-71.2157211303711,61.57032012939453,0],[-71.158203125,61.85307693481445,10],
[-66.00833129882812,73.82632446289062,0],[-71.158203125,61.85307693481445,10],[-65.5233154296875,74.696044921875,10],
[-78.2162094116211,36.1574821472168,0],[-79.7637710571289,31.10643196105957,10],[-71.158203125,61.85307693481445,10],
[-71.2157211303711,61.57032012939453,0],[-78.2162094116211,36.1574821472168,0],[-71.158203125,61.85307693481445,10],
[-91.75608825683594,12.488960266113281,0],[-99.96199798583984,6.646999835968018,0],[-94.36699676513672,10.354000091552734,10],
[-91.75608825683594,12.488960266113281,0],[-94.36699676513672,10.354000091552734,10],[-86.5580825805664,18.218172073364258,10],
[-82.87432098388672,23.8238582611084,0],[-91.75608825683594,12.488960266113281,0],[-86.5580825805664,18.218172073364258,10],
[-82.87432098388672,23.8238582611084,0],[-86.5580825805664,18.218172073364258,10],[-79.7637710571289,31.10643196105957,10],
[-78.2162094116211,36.1574821472168,0],[-82.87432098388672,23.8238582611084,0],[-79.7637710571289,31.10643196105957,10],
[-129.7556915283203,22.115089416503906,0],[-128.45645141601562,19.52318572998047,10],[-127.93460083007812,14.87568473815918,0],
[-133.2444610595703,26.04967498779297,10],[-128.45645141601562,19.52318572998047,10],[-129.7556915283203,22.115089416503906,0],
[-109.18265533447266,3.0529377460479736,0],[-118.68699645996094,2.3949999809265137,0],[-112.2509994506836,2.5969998836517334,10],
[-109.18265533447266,3.0529377460479736,0],[-112.2509994506836,2.5969998836517334,10],[-102.994140625,5.075331211090088,10],
[-99.96199798583984,6.646999835968018,0],[-109.18265533447266,3.0529377460479736,0],[-102.994140625,5.075331211090088,10],
[-99.96199798583984,6.646999835968018,0],[-102.994140625,5.075331211090088,10],[-94.36699676513672,10.354000091552734,10],
[-127.93460083007812,14.87568473815918,0],[-128.36959838867188,13.199297904968262,10],[-130.39068603515625,8.408939361572266,0],
[-130.39068603515625,8.408939361572266,0],[-128.36959838867188,13.199297904968262,10],[-130.60891723632812,7.312777519226074,10],
[-128.45645141601562,19.52318572998047,10],[-128.36959838867188,13.199297904968262,10],[-127.93460083007812,14.87568473815918,0],
[-130.39068603515625,8.408939361572266,0],[-130.60891723632812,7.312777519226074,10],[-130.15463256835938,6.1173176765441895,0],
[-130.15463256835938,6.1173176765441895,0],[-130.60891723632812,7.312777519226074,10],[-128.7202911376953,4.784153938293457,10],
[-127.23291778564453,4.098145961761475,0],[-130.15463256835938,6.1173176765441895,0],[-128.7202911376953,4.784153938293457,10],
[-127.23291778564453,4.098145961761475,0],[-128.7202911376953,4.784153938293457,10],[-120.97369384765625,2.577406167984009,10],
[-118.68699645996094,2.3949999809265137,0],[-127.23291778564453,4.098145961761475,0],[-120.97369384765625,2.577406167984009,10],
[-118.68699645996094,2.3949999809265137,0],[-120.97369384765625,2.577406167984009,10],[-112.2509994506836,2.5969998836517334,10],
[-6.910058498382568,-40.90201950073242,0],[-3.135453224182129,-44.18324279785156,10],[-6.914295196533203,-40.92919921875,10],
[-3.1204490661621094,-44.15435791015625,0],[-3.135453224182129,-44.18324279785156,10],[-6.910058498382568,-40.90201950073242,0],
[-1.3202555179595947,-44.23619842529297,0],[-1.1721389293670654,-44.13786697387695,10],[-3.135453224182129,-44.18324279785156,10],
[-1.3202555179595947,-44.23619842529297,0],[-3.135453224182129,-44.18324279785156,10],[-3.1204490661621094,-44.15435791015625,0],
[-9.967960357666016,-44.82192611694336,10],[-6.910058498382568,-40.90201950073242,0],[-6.914295196533203,-40.92919921875,10],
[-16.802860260009766,-42.10857391357422,0],[-12.522496223449707,-45.394588470458984,10],[-16.7452392578125,-42.088287353515625,10],
[-12.106162071228027,-45.45663833618164,0],[-12.522496223449707,-45.394588470458984,10],[-16.802860260009766,-42.10857391357422,0],
[-9.967960357666016,-44.82192611694336,10],[-12.522496223449707,-45.394588470458984,10],[-12.106162071228027,-45.45663833618164,0],
[-9.933637619018555,-44.75432586669922,0],[-9.967960357666016,-44.82192611694336,10],[-12.106162071228027,-45.45663833618164,0],
[-8.260000228881836,103.4800033569336,0],[-6.732726097106934,94.14342498779297,0],[-30.881000518798828,103.4800033569336,0],
[-6.732726097106934,94.14342498779297,0],[-3.0780553817749023,85.39581298828125,0],[-30.881000518798828,103.4800033569336,0],
[-7.748112201690674,70.4377670288086,0],[-48.8859977722168,93.69190979003906,0],[-3.0780553817749023,85.39581298828125,0],
[-48.8859977722168,93.69190979003906,0],[-7.748112201690674,70.4377670288086,0],[-59.868553161621094,82.99637603759766,0],
[-59.868553161621094,82.99637603759766,0],[-7.748112201690674,70.4377670288086,0],[-66.00833129882812,73.82632446289062,0],
[-30.881000518798828,103.4800033569336,0],[-3.0780553817749023,85.39581298828125,0],[-48.8859977722168,93.69190979003906,0],
[-66.00833129882812,73.82632446289062,0],[-7.748112201690674,70.4377670288086,0],[-71.2157211303711,61.57032012939453,0],
[-4.485143184661865,55.76621627807617,0],[-71.2157211303711,61.57032012939453,0],[-7.748112201690674,70.4377670288086,0],
[-82.87432098388672,23.8238582611084,0],[-78.2162094116211,36.1574821472168,0],[-0.3182032108306885,50.23066329956055,0],
[-4.485143184661865,55.76621627807617,0],[-0.3182032108306885,50.23066329956055,0],[-78.2162094116211,36.1574821472168,0],
[-78.2162094116211,36.1574821472168,0],[-71.2157211303711,61.57032012939453,0],[-4.485143184661865,55.76621627807617,0],
[-91.75608825683594,12.488960266113281,0],[-43.21868896484375,-36.18983459472656,0],[-99.96199798583984,6.646999835968018,0],
[-82.87432098388672,23.8238582611084,0],[-43.21868896484375,-36.18983459472656,0],[-91.75608825683594,12.488960266113281,0],
[-129.7556915283203,22.115089416503906,0],[-127.93460083007812,14.87568473815918,0],[-162.83412170410156,26.783966064453125,0],
[-130.39068603515625,8.408939361572266,0],[-162.83412170410156,26.783966064453125,0],[-127.93460083007812,14.87568473815918,0],
[-109.18265533447266,3.0529377460479736,0],[-152.92137145996094,-35.468204498291016,0],[-118.68699645996094,2.3949999809265137,0],
[-127.23291778564453,4.098145961761475,0],[-118.68699645996094,2.3949999809265137,0],[-152.92137145996094,-35.468204498291016,0],
[-6.910058498382568,-40.90201950073242,0],[-1.3202555179595947,-44.23619842529297,0],[-3.1204490661621094,-44.15435791015625,0],
[-9.967960357666016,-44.82192611694336,10],[-9.933637619018555,-44.75432586669922,0],[-6.910058498382568,-40.90201950073242,0],
[-25.190332412719727,-40.7976188659668,0],[-25.483245849609375,-40.286685943603516,10],[-26.836881637573242,-39.77979278564453,0],
[-26.836881637573242,-39.77979278564453,0],[-25.483245849609375,-40.286685943603516,10],[-27.580223083496094,-40.037071228027344,10],
[-16.802860260009766,-42.10857391357422,0],[-82.87432098388672,23.8238582611084,0],[-12.106162071228027,-45.45663833618164,0],
[-82.87432098388672,23.8238582611084,0],[-6.910058498382568,-40.90201950073242,0],[-9.933637619018555,-44.75432586669922,0],
[-82.87432098388672,23.8238582611084,0],[-9.933637619018555,-44.75432586669922,0],[-12.106162071228027,-45.45663833618164,0],
[-26.836881637573242,-39.77979278564453,0],[-82.87432098388672,23.8238582611084,0],[-25.190332412719727,-40.7976188659668,0],
[-26.836881637573242,-39.77979278564453,0],[-35.47990036010742,-37.94115447998047,0],[-82.87432098388672,23.8238582611084,0],
[-16.802860260009766,-42.10857391357422,0],[-22.089555740356445,-45.56987762451172,0],[-24.740772247314453,-43.16035461425781,0],
[-24.740772247314453,-43.16035461425781,0],[-25.190332412719727,-40.7976188659668,0],[-16.802860260009766,-42.10857391357422,0],
[-82.87432098388672,23.8238582611084,0],[-16.802860260009766,-42.10857391357422,0],[-25.190332412719727,-40.7976188659668,0],
[-26.836881637573242,-39.77979278564453,0],[-30.970531463623047,-42.28350830078125,0],[-35.47990036010742,-37.94115447998047,0],
[-40.356285095214844,-37.40169906616211,0],[-82.87432098388672,23.8238582611084,0],[-35.47990036010742,-37.94115447998047,0],
[-40.356285095214844,-37.40169906616211,0],[-43.21868896484375,-36.18983459472656,0],[-82.87432098388672,23.8238582611084,0],
[-33.775108337402344,-41.39454650878906,0],[-35.47990036010742,-37.94115447998047,0],[-30.970531463623047,-42.28350830078125,0],
[-16.802860260009766,-42.10857391357422,0],[-16.7452392578125,-42.088287353515625,10],[-22.10101318359375,-45.594539642333984,10],
[-24.740772247314453,-43.16035461425781,0],[-22.10101318359375,-45.594539642333984,10],[-24.770307540893555,-43.088199615478516,10],
[-22.089555740356445,-45.56987762451172,0],[-16.802860260009766,-42.10857391357422,0],[-22.10101318359375,-45.594539642333984,10],
[-22.10101318359375,-45.594539642333984,10],[-24.740772247314453,-43.16035461425781,0],[-22.089555740356445,-45.56987762451172,0],
[-30.970531463623047,-42.28350830078125,0],[-31.242631912231445,-42.32703399658203,10],[-33.775108337402344,-41.39454650878906,0],
[-25.190332412719727,-40.7976188659668,0],[-24.740772247314453,-43.16035461425781,0],[-24.770307540893555,-43.088199615478516,10],
[-25.190332412719727,-40.7976188659668,0],[-24.770307540893555,-43.088199615478516,10],[-25.483245849609375,-40.286685943603516,10],
[-30.970531463623047,-42.28350830078125,0],[-27.580223083496094,-40.037071228027344,10],[-31.242631912231445,-42.32703399658203,10],
[-30.970531463623047,-42.28350830078125,0],[-26.836881637573242,-39.77979278564453,0],[-27.580223083496094,-40.037071228027344,10],
[-35.47990036010742,-37.94115447998047,0],[-33.775108337402344,-41.39454650878906,0],[-33.92977523803711,-41.22837448120117,10],
[-35.47990036010742,-37.94115447998047,0],[-33.92977523803711,-41.22837448120117,10],[-35.47004699707031,-37.97396469116211,10],
[-35.47990036010742,-37.94115447998047,0],[-35.47004699707031,-37.97396469116211,10],[-41.4198112487793,-37.21235656738281,10],
[-35.47990036010742,-37.94115447998047,0],[-41.4198112487793,-37.21235656738281,10],[-40.356285095214844,-37.40169906616211,0],
[-40.356285095214844,-37.40169906616211,0],[-41.4198112487793,-37.21235656738281,10],[-43.21868896484375,-36.18983459472656,0],
[-43.21868896484375,-36.18983459472656,0],[-41.4198112487793,-37.21235656738281,10],[-53.33951187133789,-35.874061584472656,10],
[-31.242631912231445,-42.32703399658203,10],[-33.92977523803711,-41.22837448120117,10],[-33.775108337402344,-41.39454650878906,0],
[-152.92137145996094,-35.468204498291016,0],[-171.0751953125,-36.22438049316406,0],[-181.8504180908203,9.858535766601562,0],
[-43.21868896484375,-36.18983459472656,0],[-152.92137145996094,-35.468204498291016,0],[-109.18265533447266,3.0529377460479736,0],
[-99.96199798583984,6.646999835968018,0],[-43.21868896484375,-36.18983459472656,0],[-109.18265533447266,3.0529377460479736,0],
[49.36561584472656,-8.76927375793457,0],[52.056949615478516,-10.32032585144043,0],[49.53274154663086,-8.809224128723145,10],
[52.056949615478516,-10.32032585144043,0],[49.962650299072266,-10.331576347351074,10],[52.048072814941406,-10.315421104431152,10],
[52.048072814941406,-10.315421104431152,10],[49.53274154663086,-8.809224128723145,10],[52.056949615478516,-10.32032585144043,0],
[-139.84039306640625,29.28890037536621,10],[-204.3284912109375,-34.645782470703125,10],[-133.2444610595703,26.04967498779297,10],
[-153.567138671875,29.858436584472656,10],[-204.3284912109375,-34.645782470703125,10],[-139.84039306640625,29.28890037536621,10],
[-162.2031707763672,27.13936996459961,10],[-204.3284912109375,-34.645782470703125,10],[-153.567138671875,29.858436584472656,10],
[-204.3284912109375,-34.645782470703125,10],[-170.90338134765625,-36.21523666381836,10],[-130.60891723632812,7.312777519226074,10],
[-133.2444610595703,26.04967498779297,10],[-204.3284912109375,-34.645782470703125,10],[-130.60891723632812,7.312777519226074,10],
[-130.60891723632812,7.312777519226074,10],[-128.36959838867188,13.199297904968262,10],[-133.2444610595703,26.04967498779297,10],
[-162.2031707763672,27.13936996459961,10],[-175.01324462890625,17.790390014648438,10],[-204.3284912109375,-34.645782470703125,10],
[-181.78970336914062,9.995529174804688,10],[-204.3284912109375,-34.645782470703125,10],[-175.01324462890625,17.790390014648438,10],
[-193.16064453125,-8.533787727355957,10],[-201.43392944335938,-17.39444923400879,10],[-204.3284912109375,-34.645782470703125,10],
[-193.16064453125,-8.533787727355957,10],[-204.3284912109375,-34.645782470703125,10],[-181.78970336914062,9.995529174804688,10],
[-170.90338134765625,-36.21523666381836,10],[-154.16140747070312,-35.52764892578125,10],[-130.60891723632812,7.312777519226074,10],
[-128.7202911376953,4.784153938293457,10],[-130.60891723632812,7.312777519226074,10],[-154.16140747070312,-35.52764892578125,10],
[-120.97369384765625,2.577406167984009,10],[-128.7202911376953,4.784153938293457,10],[-154.16140747070312,-35.52764892578125,10],
[-212.09007263183594,-29.714599609375,10],[-207.84930419921875,-31.84939193725586,10],[-213.0622100830078,-28.042200088500977,10],
[-201.43392944335938,-17.39444923400879,10],[-213.0622100830078,-28.042200088500977,10],[-207.84930419921875,-31.84939193725586,10],
[-207.84930419921875,-31.84939193725586,10],[-204.3284912109375,-34.645782470703125,10],[-201.43392944335938,-17.39444923400879,10],
[-162.83412170410156,26.783966064453125,0],[-154.28233337402344,29.771726608276367,0],[-140.54364013671875,29.44390869140625,0],
[-162.83412170410156,26.783966064453125,0],[-140.54364013671875,29.44390869140625,0],[-134.27857971191406,26.770544052124023,0],
[-162.83412170410156,26.783966064453125,0],[-134.27857971191406,26.770544052124023,0],[-129.7556915283203,22.115089416503906,0],
[-130.15463256835938,6.1173176765441895,0],[-127.23291778564453,4.098145961761475,0],[-152.92137145996094,-35.468204498291016,0],
[-175.51565551757812,17.33550262451172,0],[-162.83412170410156,26.783966064453125,0],[-130.15463256835938,6.1173176765441895,0],
[-181.8504180908203,9.858535766601562,0],[-175.51565551757812,17.33550262451172,0],[-130.15463256835938,6.1173176765441895,0],
[-130.39068603515625,8.408939361572266,0],[-130.15463256835938,6.1173176765441895,0],[-162.83412170410156,26.783966064453125,0],
[-204.9325714111328,-34.53371047973633,0],[-199.14105224609375,-15.491259574890137,0],[-171.0751953125,-36.22438049316406,0],
[-130.15463256835938,6.1173176765441895,0],[-152.92137145996094,-35.468204498291016,0],[-181.8504180908203,9.858535766601562,0],
[-192.3775634765625,-7.343181133270264,0],[-181.8504180908203,9.858535766601562,0],[-171.0751953125,-36.22438049316406,0],
[-199.14105224609375,-15.491259574890137,0],[-192.3775634765625,-7.343181133270264,0],[-171.0751953125,-36.22438049316406,0],
[-209.1544952392578,-23.985443115234375,0],[-207.81443786621094,-31.88942527770996,0],[-213.1012725830078,-28.137075424194336,0],
[-199.14105224609375,-15.491259574890137,0],[-207.81443786621094,-31.88942527770996,0],[-209.1544952392578,-23.985443115234375,0],
[-211.85186767578125,-29.86714744567871,0],[-213.1012725830078,-28.137075424194336,0],[-207.81443786621094,-31.88942527770996,0],
[-207.81443786621094,-31.88942527770996,0],[-199.14105224609375,-15.491259574890137,0],[-204.9325714111328,-34.53371047973633,0],
[52.056949615478516,-10.32032585144043,0],[49.80349349975586,-10.301359176635742,0],[49.962650299072266,-10.331576347351074,10],
[49.36561584472656,-8.76927375793457,0],[49.53274154663086,-8.809224128723145,10],[44.499000549316406,-8.720000267028809,10],
[49.36561584472656,-8.76927375793457,0],[44.499000549316406,-8.720000267028809,10],[44.499000549316406,-8.720000267028809,0],
[49.80349349975586,-10.301359176635742,0],[44.499000549316406,-8.720000267028809,0],[44.499000549316406,-8.720000267028809,10],
[49.80349349975586,-10.301359176635742,0],[44.499000549316406,-8.720000267028809,10],[49.962650299072266,-10.331576347351074,10],
[11.888999938964844,-34.678001403808594,10],[74.51927185058594,-34.40031051635742,0],[66.33106231689453,-34.47044372558594,10],
[7.481036186218262,-40.55931091308594,0],[10.165343284606934,-38.80281066894531,10],[7.306832790374756,-40.499656677246094,10],
[11.888999938964844,-34.678001403808594,10],[11.888999938964844,-34.678001403808594,0],[74.51927185058594,-34.40031051635742,0],
[10.309722900390625,-38.512943267822266,0],[10.165343284606934,-38.80281066894531,10],[7.481036186218262,-40.55931091308594,0],
[11.888999938964844,-34.678001403808594,0],[11.888999938964844,-34.678001403808594,10],[10.165343284606934,-38.80281066894531,10],
[11.888999938964844,-34.678001403808594,0],[10.165343284606934,-38.80281066894531,10],[10.309722900390625,-38.512943267822266,0],
[7.481036186218262,-40.55931091308594,0],[7.306832790374756,-40.499656677246094,10],[3.173877239227295,-39.01404571533203,10],
[7.481036186218262,-40.55931091308594,0],[3.173877239227295,-39.01404571533203,10],[3.1396639347076416,-39.02231216430664,0],
[3.1396639347076416,-39.02231216430664,0],[3.173877239227295,-39.01404571533203,10],[-1.1721389293670654,-44.13786697387695,10],
[3.1396639347076416,-39.02231216430664,0],[-1.1721389293670654,-44.13786697387695,10],[-1.3202555179595947,-44.23619842529297,0] ],
faces=[[0,1,2],[3,4,5],[6,7,8],
[9,10,11],[12,13,14],[15,16,17],
[18,19,20],[21,22,23],[24,25,26],
[27,28,29],[30,31,32],[33,34,35],
[36,37,38],[39,40,41],[42,43,44],
[45,46,47],[48,49,50],[51,52,53],
[54,55,56],[57,58,59],[60,61,62],
[63,64,65],[66,67,68],[69,70,71],
[72,73,74],[75,76,77],[78,79,80],
[81,82,83],[84,85,86],[87,88,89],
[90,91,92],[93,94,95],[96,97,98],
[99,100,101],[102,103,104],[105,106,107],
[108,109,110],[111,112,113],[114,115,116],
[117,118,119],[120,121,122],[123,124,125],
[126,127,128],[129,130,131],[132,133,134],
[135,136,137],[138,139,140],[141,142,143],
[144,145,146],[147,148,149],[150,151,152],
[153,154,155],[156,157,158],[159,160,161],
[162,163,164],[165,166,167],[168,169,170],
[171,172,173],[174,175,176],[177,178,179],
[180,181,182],[183,184,185],[186,187,188],
[189,190,191],[192,193,194],[195,196,197],
[198,199,200],[201,202,203],[204,205,206],
[207,208,209],[210,211,212],[213,214,215],
[216,217,218],[219,220,221],[222,223,224],
[225,226,227],[228,229,230],[231,232,233],
[234,235,236],[237,238,239],[240,241,242],
[243,244,245],[246,247,248],[249,250,251],
[252,253,254],[255,256,257],[258,259,260],
[261,262,263],[264,265,266],[267,268,269],
[270,271,272],[273,274,275],[276,277,278],
[279,280,281],[282,283,284],[285,286,287],
[288,289,290],[291,292,293],[294,295,296],
[297,298,299],[300,301,302],[303,304,305],
[306,307,308],[309,310,311],[312,313,314],
[315,316,317],[318,319,320],[321,322,323],
[324,325,326],[327,328,329],[330,331,332],
[333,334,335],[336,337,338],[339,340,341],
[342,343,344],[345,346,347],[348,349,350],
[351,352,353],[354,355,356],[357,358,359],
[360,361,362],[363,364,365],[366,367,368],
[369,370,371],[372,373,374],[375,376,377],
[378,379,380],[381,382,383],[384,385,386],
[387,388,389],[390,391,392],[393,394,395],
[396,397,398],[399,400,401],[402,403,404],
[405,406,407],[408,409,410],[411,412,413],
[414,415,416],[417,418,419],[420,421,422],
[423,424,425],[426,427,428],[429,430,431],
[432,433,434],[435,436,437],[438,439,440],
[441,442,443],[444,445,446],[447,448,449],
[450,451,452],[453,454,455],[456,457,458],
[459,460,461],[462,463,464],[465,466,467],
[468,469,470],[471,472,473],[474,475,476],
[477,478,479],[480,481,482],[483,484,485],
[486,487,488],[489,490,491],[492,493,494],
[495,496,497],[498,499,500],[501,502,503],
[504,505,506],[507,508,509],[510,511,512],
[513,514,515],[516,517,518],[519,520,521],
[522,523,524],[525,526,527],[528,529,530],
[531,532,533],[534,535,536],[537,538,539],
[540,541,542],[543,544,545],[546,547,548],
[549,550,551],[552,553,554],[555,556,557],
[558,559,560],[561,562,563],[564,565,566],
[567,568,569],[570,571,572],[573,574,575],
[576,577,578],[579,580,581],[582,583,584],
[585,586,587],[588,589,590],[591,592,593],
[594,595,596],[597,598,599],[600,601,602],
[603,604,605],[606,607,608],[609,610,611],
[612,613,614],[615,616,617],[618,619,620],
[621,622,623],[624,625,626],[627,628,629],
[630,631,632],[633,634,635],[636,637,638],
[639,640,641],[642,643,644],[645,646,647],
[648,649,650],[651,652,653],[654,655,656],
[657,658,659],[660,661,662],[663,664,665],
[666,667,668],[669,670,671],[672,673,674],
[675,676,677],[678,679,680],[681,682,683],
[684,685,686],[687,688,689],[690,691,692],
[693,694,695],[696,697,698],[699,700,701],
[702,703,704],[705,706,707],[708,709,710],
[711,712,713],[714,715,716],[717,718,719],
[720,721,722],[723,724,725],[726,727,728],
[729,730,731],[732,733,734],[735,736,737],
[738,739,740],[741,742,743],[744,745,746],
[747,748,749],[750,751,752],[753,754,755],
[756,757,758],[759,760,761],[762,763,764],
[765,766,767],[768,769,770],[771,772,773],
[774,775,776],[777,778,779],[780,781,782],
[783,784,785],[786,787,788],[789,790,791],
[792,793,794],[795,796,797],[798,799,800],
[801,802,803],[804,805,806],[807,808,809],
[810,811,812],[813,814,815],[816,817,818],
[819,820,821],[822,823,824],[825,826,827],
[828,829,830],[831,832,833],[834,835,836],
[837,838,839],[840,841,842],[843,844,845],
[846,847,848],[849,850,851],[852,853,854],
[855,856,857],[858,859,860],[861,862,863],
[864,865,866],[867,868,869],[870,871,872],
[873,874,875],[876,877,878],[879,880,881],
[882,883,884],[885,886,887],[888,889,890],
[891,892,893],[894,895,896],[897,898,899],
[900,901,902],[903,904,905],[906,907,908],
[909,910,911],[912,913,914],[915,916,917],
[918,919,920],[921,922,923],[924,925,926],
[927,928,929],[930,931,932],[933,934,935],
[936,937,938],[939,940,941],[942,943,944],
[945,946,947],[948,949,950],[951,952,953],
[954,955,956],[957,958,959],[960,961,962],
[963,964,965],[966,967,968],[969,970,971],
[972,973,974],[975,976,977],[978,979,980],
[981,982,983],[984,985,986],[987,988,989],
[990,991,992],[993,994,995],[996,997,998],
[999,1000,1001],[1002,1003,1004],[1005,1006,1007],
[1008,1009,1010],[1011,1012,1013],[1014,1015,1016],
[1017,1018,1019],[1020,1021,1022],[1023,1024,1025],
[1026,1027,1028],[1029,1030,1031],[1032,1033,1034],
[1035,1036,1037],[1038,1039,1040],[1041,1042,1043],
[1044,1045,1046],[1047,1048,1049],[1050,1051,1052],
[1053,1054,1055],[1056,1057,1058],[1059,1060,1061],
[1062,1063,1064],[1065,1066,1067],[1068,1069,1070],
[1071,1072,1073],[1074,1075,1076],[1077,1078,1079],
[1080,1081,1082],[1083,1084,1085],[1086,1087,1088],
[1089,1090,1091],[1092,1093,1094],[1095,1096,1097],
[1098,1099,1100],[1101,1102,1103],[1104,1105,1106],
[1107,1108,1109],[1110,1111,1112],[1113,1114,1115],
[1116,1117,1118],[1119,1120,1121],[1122,1123,1124],
[1125,1126,1127],[1128,1129,1130],[1131,1132,1133],
[1134,1135,1136],[1137,1138,1139],[1140,1141,1142],
[1143,1144,1145],[1146,1147,1148],[1149,1150,1151],
[1152,1153,1154],[1155,1156,1157],[1158,1159,1160],
[1161,1162,1163],[1164,1165,1166],[1167,1168,1169]]);}

function object1Min() = [-213.101, -45.595, 0.000];
function object1Max() = [213.104, 103.480, 10.000];

object1(1);
